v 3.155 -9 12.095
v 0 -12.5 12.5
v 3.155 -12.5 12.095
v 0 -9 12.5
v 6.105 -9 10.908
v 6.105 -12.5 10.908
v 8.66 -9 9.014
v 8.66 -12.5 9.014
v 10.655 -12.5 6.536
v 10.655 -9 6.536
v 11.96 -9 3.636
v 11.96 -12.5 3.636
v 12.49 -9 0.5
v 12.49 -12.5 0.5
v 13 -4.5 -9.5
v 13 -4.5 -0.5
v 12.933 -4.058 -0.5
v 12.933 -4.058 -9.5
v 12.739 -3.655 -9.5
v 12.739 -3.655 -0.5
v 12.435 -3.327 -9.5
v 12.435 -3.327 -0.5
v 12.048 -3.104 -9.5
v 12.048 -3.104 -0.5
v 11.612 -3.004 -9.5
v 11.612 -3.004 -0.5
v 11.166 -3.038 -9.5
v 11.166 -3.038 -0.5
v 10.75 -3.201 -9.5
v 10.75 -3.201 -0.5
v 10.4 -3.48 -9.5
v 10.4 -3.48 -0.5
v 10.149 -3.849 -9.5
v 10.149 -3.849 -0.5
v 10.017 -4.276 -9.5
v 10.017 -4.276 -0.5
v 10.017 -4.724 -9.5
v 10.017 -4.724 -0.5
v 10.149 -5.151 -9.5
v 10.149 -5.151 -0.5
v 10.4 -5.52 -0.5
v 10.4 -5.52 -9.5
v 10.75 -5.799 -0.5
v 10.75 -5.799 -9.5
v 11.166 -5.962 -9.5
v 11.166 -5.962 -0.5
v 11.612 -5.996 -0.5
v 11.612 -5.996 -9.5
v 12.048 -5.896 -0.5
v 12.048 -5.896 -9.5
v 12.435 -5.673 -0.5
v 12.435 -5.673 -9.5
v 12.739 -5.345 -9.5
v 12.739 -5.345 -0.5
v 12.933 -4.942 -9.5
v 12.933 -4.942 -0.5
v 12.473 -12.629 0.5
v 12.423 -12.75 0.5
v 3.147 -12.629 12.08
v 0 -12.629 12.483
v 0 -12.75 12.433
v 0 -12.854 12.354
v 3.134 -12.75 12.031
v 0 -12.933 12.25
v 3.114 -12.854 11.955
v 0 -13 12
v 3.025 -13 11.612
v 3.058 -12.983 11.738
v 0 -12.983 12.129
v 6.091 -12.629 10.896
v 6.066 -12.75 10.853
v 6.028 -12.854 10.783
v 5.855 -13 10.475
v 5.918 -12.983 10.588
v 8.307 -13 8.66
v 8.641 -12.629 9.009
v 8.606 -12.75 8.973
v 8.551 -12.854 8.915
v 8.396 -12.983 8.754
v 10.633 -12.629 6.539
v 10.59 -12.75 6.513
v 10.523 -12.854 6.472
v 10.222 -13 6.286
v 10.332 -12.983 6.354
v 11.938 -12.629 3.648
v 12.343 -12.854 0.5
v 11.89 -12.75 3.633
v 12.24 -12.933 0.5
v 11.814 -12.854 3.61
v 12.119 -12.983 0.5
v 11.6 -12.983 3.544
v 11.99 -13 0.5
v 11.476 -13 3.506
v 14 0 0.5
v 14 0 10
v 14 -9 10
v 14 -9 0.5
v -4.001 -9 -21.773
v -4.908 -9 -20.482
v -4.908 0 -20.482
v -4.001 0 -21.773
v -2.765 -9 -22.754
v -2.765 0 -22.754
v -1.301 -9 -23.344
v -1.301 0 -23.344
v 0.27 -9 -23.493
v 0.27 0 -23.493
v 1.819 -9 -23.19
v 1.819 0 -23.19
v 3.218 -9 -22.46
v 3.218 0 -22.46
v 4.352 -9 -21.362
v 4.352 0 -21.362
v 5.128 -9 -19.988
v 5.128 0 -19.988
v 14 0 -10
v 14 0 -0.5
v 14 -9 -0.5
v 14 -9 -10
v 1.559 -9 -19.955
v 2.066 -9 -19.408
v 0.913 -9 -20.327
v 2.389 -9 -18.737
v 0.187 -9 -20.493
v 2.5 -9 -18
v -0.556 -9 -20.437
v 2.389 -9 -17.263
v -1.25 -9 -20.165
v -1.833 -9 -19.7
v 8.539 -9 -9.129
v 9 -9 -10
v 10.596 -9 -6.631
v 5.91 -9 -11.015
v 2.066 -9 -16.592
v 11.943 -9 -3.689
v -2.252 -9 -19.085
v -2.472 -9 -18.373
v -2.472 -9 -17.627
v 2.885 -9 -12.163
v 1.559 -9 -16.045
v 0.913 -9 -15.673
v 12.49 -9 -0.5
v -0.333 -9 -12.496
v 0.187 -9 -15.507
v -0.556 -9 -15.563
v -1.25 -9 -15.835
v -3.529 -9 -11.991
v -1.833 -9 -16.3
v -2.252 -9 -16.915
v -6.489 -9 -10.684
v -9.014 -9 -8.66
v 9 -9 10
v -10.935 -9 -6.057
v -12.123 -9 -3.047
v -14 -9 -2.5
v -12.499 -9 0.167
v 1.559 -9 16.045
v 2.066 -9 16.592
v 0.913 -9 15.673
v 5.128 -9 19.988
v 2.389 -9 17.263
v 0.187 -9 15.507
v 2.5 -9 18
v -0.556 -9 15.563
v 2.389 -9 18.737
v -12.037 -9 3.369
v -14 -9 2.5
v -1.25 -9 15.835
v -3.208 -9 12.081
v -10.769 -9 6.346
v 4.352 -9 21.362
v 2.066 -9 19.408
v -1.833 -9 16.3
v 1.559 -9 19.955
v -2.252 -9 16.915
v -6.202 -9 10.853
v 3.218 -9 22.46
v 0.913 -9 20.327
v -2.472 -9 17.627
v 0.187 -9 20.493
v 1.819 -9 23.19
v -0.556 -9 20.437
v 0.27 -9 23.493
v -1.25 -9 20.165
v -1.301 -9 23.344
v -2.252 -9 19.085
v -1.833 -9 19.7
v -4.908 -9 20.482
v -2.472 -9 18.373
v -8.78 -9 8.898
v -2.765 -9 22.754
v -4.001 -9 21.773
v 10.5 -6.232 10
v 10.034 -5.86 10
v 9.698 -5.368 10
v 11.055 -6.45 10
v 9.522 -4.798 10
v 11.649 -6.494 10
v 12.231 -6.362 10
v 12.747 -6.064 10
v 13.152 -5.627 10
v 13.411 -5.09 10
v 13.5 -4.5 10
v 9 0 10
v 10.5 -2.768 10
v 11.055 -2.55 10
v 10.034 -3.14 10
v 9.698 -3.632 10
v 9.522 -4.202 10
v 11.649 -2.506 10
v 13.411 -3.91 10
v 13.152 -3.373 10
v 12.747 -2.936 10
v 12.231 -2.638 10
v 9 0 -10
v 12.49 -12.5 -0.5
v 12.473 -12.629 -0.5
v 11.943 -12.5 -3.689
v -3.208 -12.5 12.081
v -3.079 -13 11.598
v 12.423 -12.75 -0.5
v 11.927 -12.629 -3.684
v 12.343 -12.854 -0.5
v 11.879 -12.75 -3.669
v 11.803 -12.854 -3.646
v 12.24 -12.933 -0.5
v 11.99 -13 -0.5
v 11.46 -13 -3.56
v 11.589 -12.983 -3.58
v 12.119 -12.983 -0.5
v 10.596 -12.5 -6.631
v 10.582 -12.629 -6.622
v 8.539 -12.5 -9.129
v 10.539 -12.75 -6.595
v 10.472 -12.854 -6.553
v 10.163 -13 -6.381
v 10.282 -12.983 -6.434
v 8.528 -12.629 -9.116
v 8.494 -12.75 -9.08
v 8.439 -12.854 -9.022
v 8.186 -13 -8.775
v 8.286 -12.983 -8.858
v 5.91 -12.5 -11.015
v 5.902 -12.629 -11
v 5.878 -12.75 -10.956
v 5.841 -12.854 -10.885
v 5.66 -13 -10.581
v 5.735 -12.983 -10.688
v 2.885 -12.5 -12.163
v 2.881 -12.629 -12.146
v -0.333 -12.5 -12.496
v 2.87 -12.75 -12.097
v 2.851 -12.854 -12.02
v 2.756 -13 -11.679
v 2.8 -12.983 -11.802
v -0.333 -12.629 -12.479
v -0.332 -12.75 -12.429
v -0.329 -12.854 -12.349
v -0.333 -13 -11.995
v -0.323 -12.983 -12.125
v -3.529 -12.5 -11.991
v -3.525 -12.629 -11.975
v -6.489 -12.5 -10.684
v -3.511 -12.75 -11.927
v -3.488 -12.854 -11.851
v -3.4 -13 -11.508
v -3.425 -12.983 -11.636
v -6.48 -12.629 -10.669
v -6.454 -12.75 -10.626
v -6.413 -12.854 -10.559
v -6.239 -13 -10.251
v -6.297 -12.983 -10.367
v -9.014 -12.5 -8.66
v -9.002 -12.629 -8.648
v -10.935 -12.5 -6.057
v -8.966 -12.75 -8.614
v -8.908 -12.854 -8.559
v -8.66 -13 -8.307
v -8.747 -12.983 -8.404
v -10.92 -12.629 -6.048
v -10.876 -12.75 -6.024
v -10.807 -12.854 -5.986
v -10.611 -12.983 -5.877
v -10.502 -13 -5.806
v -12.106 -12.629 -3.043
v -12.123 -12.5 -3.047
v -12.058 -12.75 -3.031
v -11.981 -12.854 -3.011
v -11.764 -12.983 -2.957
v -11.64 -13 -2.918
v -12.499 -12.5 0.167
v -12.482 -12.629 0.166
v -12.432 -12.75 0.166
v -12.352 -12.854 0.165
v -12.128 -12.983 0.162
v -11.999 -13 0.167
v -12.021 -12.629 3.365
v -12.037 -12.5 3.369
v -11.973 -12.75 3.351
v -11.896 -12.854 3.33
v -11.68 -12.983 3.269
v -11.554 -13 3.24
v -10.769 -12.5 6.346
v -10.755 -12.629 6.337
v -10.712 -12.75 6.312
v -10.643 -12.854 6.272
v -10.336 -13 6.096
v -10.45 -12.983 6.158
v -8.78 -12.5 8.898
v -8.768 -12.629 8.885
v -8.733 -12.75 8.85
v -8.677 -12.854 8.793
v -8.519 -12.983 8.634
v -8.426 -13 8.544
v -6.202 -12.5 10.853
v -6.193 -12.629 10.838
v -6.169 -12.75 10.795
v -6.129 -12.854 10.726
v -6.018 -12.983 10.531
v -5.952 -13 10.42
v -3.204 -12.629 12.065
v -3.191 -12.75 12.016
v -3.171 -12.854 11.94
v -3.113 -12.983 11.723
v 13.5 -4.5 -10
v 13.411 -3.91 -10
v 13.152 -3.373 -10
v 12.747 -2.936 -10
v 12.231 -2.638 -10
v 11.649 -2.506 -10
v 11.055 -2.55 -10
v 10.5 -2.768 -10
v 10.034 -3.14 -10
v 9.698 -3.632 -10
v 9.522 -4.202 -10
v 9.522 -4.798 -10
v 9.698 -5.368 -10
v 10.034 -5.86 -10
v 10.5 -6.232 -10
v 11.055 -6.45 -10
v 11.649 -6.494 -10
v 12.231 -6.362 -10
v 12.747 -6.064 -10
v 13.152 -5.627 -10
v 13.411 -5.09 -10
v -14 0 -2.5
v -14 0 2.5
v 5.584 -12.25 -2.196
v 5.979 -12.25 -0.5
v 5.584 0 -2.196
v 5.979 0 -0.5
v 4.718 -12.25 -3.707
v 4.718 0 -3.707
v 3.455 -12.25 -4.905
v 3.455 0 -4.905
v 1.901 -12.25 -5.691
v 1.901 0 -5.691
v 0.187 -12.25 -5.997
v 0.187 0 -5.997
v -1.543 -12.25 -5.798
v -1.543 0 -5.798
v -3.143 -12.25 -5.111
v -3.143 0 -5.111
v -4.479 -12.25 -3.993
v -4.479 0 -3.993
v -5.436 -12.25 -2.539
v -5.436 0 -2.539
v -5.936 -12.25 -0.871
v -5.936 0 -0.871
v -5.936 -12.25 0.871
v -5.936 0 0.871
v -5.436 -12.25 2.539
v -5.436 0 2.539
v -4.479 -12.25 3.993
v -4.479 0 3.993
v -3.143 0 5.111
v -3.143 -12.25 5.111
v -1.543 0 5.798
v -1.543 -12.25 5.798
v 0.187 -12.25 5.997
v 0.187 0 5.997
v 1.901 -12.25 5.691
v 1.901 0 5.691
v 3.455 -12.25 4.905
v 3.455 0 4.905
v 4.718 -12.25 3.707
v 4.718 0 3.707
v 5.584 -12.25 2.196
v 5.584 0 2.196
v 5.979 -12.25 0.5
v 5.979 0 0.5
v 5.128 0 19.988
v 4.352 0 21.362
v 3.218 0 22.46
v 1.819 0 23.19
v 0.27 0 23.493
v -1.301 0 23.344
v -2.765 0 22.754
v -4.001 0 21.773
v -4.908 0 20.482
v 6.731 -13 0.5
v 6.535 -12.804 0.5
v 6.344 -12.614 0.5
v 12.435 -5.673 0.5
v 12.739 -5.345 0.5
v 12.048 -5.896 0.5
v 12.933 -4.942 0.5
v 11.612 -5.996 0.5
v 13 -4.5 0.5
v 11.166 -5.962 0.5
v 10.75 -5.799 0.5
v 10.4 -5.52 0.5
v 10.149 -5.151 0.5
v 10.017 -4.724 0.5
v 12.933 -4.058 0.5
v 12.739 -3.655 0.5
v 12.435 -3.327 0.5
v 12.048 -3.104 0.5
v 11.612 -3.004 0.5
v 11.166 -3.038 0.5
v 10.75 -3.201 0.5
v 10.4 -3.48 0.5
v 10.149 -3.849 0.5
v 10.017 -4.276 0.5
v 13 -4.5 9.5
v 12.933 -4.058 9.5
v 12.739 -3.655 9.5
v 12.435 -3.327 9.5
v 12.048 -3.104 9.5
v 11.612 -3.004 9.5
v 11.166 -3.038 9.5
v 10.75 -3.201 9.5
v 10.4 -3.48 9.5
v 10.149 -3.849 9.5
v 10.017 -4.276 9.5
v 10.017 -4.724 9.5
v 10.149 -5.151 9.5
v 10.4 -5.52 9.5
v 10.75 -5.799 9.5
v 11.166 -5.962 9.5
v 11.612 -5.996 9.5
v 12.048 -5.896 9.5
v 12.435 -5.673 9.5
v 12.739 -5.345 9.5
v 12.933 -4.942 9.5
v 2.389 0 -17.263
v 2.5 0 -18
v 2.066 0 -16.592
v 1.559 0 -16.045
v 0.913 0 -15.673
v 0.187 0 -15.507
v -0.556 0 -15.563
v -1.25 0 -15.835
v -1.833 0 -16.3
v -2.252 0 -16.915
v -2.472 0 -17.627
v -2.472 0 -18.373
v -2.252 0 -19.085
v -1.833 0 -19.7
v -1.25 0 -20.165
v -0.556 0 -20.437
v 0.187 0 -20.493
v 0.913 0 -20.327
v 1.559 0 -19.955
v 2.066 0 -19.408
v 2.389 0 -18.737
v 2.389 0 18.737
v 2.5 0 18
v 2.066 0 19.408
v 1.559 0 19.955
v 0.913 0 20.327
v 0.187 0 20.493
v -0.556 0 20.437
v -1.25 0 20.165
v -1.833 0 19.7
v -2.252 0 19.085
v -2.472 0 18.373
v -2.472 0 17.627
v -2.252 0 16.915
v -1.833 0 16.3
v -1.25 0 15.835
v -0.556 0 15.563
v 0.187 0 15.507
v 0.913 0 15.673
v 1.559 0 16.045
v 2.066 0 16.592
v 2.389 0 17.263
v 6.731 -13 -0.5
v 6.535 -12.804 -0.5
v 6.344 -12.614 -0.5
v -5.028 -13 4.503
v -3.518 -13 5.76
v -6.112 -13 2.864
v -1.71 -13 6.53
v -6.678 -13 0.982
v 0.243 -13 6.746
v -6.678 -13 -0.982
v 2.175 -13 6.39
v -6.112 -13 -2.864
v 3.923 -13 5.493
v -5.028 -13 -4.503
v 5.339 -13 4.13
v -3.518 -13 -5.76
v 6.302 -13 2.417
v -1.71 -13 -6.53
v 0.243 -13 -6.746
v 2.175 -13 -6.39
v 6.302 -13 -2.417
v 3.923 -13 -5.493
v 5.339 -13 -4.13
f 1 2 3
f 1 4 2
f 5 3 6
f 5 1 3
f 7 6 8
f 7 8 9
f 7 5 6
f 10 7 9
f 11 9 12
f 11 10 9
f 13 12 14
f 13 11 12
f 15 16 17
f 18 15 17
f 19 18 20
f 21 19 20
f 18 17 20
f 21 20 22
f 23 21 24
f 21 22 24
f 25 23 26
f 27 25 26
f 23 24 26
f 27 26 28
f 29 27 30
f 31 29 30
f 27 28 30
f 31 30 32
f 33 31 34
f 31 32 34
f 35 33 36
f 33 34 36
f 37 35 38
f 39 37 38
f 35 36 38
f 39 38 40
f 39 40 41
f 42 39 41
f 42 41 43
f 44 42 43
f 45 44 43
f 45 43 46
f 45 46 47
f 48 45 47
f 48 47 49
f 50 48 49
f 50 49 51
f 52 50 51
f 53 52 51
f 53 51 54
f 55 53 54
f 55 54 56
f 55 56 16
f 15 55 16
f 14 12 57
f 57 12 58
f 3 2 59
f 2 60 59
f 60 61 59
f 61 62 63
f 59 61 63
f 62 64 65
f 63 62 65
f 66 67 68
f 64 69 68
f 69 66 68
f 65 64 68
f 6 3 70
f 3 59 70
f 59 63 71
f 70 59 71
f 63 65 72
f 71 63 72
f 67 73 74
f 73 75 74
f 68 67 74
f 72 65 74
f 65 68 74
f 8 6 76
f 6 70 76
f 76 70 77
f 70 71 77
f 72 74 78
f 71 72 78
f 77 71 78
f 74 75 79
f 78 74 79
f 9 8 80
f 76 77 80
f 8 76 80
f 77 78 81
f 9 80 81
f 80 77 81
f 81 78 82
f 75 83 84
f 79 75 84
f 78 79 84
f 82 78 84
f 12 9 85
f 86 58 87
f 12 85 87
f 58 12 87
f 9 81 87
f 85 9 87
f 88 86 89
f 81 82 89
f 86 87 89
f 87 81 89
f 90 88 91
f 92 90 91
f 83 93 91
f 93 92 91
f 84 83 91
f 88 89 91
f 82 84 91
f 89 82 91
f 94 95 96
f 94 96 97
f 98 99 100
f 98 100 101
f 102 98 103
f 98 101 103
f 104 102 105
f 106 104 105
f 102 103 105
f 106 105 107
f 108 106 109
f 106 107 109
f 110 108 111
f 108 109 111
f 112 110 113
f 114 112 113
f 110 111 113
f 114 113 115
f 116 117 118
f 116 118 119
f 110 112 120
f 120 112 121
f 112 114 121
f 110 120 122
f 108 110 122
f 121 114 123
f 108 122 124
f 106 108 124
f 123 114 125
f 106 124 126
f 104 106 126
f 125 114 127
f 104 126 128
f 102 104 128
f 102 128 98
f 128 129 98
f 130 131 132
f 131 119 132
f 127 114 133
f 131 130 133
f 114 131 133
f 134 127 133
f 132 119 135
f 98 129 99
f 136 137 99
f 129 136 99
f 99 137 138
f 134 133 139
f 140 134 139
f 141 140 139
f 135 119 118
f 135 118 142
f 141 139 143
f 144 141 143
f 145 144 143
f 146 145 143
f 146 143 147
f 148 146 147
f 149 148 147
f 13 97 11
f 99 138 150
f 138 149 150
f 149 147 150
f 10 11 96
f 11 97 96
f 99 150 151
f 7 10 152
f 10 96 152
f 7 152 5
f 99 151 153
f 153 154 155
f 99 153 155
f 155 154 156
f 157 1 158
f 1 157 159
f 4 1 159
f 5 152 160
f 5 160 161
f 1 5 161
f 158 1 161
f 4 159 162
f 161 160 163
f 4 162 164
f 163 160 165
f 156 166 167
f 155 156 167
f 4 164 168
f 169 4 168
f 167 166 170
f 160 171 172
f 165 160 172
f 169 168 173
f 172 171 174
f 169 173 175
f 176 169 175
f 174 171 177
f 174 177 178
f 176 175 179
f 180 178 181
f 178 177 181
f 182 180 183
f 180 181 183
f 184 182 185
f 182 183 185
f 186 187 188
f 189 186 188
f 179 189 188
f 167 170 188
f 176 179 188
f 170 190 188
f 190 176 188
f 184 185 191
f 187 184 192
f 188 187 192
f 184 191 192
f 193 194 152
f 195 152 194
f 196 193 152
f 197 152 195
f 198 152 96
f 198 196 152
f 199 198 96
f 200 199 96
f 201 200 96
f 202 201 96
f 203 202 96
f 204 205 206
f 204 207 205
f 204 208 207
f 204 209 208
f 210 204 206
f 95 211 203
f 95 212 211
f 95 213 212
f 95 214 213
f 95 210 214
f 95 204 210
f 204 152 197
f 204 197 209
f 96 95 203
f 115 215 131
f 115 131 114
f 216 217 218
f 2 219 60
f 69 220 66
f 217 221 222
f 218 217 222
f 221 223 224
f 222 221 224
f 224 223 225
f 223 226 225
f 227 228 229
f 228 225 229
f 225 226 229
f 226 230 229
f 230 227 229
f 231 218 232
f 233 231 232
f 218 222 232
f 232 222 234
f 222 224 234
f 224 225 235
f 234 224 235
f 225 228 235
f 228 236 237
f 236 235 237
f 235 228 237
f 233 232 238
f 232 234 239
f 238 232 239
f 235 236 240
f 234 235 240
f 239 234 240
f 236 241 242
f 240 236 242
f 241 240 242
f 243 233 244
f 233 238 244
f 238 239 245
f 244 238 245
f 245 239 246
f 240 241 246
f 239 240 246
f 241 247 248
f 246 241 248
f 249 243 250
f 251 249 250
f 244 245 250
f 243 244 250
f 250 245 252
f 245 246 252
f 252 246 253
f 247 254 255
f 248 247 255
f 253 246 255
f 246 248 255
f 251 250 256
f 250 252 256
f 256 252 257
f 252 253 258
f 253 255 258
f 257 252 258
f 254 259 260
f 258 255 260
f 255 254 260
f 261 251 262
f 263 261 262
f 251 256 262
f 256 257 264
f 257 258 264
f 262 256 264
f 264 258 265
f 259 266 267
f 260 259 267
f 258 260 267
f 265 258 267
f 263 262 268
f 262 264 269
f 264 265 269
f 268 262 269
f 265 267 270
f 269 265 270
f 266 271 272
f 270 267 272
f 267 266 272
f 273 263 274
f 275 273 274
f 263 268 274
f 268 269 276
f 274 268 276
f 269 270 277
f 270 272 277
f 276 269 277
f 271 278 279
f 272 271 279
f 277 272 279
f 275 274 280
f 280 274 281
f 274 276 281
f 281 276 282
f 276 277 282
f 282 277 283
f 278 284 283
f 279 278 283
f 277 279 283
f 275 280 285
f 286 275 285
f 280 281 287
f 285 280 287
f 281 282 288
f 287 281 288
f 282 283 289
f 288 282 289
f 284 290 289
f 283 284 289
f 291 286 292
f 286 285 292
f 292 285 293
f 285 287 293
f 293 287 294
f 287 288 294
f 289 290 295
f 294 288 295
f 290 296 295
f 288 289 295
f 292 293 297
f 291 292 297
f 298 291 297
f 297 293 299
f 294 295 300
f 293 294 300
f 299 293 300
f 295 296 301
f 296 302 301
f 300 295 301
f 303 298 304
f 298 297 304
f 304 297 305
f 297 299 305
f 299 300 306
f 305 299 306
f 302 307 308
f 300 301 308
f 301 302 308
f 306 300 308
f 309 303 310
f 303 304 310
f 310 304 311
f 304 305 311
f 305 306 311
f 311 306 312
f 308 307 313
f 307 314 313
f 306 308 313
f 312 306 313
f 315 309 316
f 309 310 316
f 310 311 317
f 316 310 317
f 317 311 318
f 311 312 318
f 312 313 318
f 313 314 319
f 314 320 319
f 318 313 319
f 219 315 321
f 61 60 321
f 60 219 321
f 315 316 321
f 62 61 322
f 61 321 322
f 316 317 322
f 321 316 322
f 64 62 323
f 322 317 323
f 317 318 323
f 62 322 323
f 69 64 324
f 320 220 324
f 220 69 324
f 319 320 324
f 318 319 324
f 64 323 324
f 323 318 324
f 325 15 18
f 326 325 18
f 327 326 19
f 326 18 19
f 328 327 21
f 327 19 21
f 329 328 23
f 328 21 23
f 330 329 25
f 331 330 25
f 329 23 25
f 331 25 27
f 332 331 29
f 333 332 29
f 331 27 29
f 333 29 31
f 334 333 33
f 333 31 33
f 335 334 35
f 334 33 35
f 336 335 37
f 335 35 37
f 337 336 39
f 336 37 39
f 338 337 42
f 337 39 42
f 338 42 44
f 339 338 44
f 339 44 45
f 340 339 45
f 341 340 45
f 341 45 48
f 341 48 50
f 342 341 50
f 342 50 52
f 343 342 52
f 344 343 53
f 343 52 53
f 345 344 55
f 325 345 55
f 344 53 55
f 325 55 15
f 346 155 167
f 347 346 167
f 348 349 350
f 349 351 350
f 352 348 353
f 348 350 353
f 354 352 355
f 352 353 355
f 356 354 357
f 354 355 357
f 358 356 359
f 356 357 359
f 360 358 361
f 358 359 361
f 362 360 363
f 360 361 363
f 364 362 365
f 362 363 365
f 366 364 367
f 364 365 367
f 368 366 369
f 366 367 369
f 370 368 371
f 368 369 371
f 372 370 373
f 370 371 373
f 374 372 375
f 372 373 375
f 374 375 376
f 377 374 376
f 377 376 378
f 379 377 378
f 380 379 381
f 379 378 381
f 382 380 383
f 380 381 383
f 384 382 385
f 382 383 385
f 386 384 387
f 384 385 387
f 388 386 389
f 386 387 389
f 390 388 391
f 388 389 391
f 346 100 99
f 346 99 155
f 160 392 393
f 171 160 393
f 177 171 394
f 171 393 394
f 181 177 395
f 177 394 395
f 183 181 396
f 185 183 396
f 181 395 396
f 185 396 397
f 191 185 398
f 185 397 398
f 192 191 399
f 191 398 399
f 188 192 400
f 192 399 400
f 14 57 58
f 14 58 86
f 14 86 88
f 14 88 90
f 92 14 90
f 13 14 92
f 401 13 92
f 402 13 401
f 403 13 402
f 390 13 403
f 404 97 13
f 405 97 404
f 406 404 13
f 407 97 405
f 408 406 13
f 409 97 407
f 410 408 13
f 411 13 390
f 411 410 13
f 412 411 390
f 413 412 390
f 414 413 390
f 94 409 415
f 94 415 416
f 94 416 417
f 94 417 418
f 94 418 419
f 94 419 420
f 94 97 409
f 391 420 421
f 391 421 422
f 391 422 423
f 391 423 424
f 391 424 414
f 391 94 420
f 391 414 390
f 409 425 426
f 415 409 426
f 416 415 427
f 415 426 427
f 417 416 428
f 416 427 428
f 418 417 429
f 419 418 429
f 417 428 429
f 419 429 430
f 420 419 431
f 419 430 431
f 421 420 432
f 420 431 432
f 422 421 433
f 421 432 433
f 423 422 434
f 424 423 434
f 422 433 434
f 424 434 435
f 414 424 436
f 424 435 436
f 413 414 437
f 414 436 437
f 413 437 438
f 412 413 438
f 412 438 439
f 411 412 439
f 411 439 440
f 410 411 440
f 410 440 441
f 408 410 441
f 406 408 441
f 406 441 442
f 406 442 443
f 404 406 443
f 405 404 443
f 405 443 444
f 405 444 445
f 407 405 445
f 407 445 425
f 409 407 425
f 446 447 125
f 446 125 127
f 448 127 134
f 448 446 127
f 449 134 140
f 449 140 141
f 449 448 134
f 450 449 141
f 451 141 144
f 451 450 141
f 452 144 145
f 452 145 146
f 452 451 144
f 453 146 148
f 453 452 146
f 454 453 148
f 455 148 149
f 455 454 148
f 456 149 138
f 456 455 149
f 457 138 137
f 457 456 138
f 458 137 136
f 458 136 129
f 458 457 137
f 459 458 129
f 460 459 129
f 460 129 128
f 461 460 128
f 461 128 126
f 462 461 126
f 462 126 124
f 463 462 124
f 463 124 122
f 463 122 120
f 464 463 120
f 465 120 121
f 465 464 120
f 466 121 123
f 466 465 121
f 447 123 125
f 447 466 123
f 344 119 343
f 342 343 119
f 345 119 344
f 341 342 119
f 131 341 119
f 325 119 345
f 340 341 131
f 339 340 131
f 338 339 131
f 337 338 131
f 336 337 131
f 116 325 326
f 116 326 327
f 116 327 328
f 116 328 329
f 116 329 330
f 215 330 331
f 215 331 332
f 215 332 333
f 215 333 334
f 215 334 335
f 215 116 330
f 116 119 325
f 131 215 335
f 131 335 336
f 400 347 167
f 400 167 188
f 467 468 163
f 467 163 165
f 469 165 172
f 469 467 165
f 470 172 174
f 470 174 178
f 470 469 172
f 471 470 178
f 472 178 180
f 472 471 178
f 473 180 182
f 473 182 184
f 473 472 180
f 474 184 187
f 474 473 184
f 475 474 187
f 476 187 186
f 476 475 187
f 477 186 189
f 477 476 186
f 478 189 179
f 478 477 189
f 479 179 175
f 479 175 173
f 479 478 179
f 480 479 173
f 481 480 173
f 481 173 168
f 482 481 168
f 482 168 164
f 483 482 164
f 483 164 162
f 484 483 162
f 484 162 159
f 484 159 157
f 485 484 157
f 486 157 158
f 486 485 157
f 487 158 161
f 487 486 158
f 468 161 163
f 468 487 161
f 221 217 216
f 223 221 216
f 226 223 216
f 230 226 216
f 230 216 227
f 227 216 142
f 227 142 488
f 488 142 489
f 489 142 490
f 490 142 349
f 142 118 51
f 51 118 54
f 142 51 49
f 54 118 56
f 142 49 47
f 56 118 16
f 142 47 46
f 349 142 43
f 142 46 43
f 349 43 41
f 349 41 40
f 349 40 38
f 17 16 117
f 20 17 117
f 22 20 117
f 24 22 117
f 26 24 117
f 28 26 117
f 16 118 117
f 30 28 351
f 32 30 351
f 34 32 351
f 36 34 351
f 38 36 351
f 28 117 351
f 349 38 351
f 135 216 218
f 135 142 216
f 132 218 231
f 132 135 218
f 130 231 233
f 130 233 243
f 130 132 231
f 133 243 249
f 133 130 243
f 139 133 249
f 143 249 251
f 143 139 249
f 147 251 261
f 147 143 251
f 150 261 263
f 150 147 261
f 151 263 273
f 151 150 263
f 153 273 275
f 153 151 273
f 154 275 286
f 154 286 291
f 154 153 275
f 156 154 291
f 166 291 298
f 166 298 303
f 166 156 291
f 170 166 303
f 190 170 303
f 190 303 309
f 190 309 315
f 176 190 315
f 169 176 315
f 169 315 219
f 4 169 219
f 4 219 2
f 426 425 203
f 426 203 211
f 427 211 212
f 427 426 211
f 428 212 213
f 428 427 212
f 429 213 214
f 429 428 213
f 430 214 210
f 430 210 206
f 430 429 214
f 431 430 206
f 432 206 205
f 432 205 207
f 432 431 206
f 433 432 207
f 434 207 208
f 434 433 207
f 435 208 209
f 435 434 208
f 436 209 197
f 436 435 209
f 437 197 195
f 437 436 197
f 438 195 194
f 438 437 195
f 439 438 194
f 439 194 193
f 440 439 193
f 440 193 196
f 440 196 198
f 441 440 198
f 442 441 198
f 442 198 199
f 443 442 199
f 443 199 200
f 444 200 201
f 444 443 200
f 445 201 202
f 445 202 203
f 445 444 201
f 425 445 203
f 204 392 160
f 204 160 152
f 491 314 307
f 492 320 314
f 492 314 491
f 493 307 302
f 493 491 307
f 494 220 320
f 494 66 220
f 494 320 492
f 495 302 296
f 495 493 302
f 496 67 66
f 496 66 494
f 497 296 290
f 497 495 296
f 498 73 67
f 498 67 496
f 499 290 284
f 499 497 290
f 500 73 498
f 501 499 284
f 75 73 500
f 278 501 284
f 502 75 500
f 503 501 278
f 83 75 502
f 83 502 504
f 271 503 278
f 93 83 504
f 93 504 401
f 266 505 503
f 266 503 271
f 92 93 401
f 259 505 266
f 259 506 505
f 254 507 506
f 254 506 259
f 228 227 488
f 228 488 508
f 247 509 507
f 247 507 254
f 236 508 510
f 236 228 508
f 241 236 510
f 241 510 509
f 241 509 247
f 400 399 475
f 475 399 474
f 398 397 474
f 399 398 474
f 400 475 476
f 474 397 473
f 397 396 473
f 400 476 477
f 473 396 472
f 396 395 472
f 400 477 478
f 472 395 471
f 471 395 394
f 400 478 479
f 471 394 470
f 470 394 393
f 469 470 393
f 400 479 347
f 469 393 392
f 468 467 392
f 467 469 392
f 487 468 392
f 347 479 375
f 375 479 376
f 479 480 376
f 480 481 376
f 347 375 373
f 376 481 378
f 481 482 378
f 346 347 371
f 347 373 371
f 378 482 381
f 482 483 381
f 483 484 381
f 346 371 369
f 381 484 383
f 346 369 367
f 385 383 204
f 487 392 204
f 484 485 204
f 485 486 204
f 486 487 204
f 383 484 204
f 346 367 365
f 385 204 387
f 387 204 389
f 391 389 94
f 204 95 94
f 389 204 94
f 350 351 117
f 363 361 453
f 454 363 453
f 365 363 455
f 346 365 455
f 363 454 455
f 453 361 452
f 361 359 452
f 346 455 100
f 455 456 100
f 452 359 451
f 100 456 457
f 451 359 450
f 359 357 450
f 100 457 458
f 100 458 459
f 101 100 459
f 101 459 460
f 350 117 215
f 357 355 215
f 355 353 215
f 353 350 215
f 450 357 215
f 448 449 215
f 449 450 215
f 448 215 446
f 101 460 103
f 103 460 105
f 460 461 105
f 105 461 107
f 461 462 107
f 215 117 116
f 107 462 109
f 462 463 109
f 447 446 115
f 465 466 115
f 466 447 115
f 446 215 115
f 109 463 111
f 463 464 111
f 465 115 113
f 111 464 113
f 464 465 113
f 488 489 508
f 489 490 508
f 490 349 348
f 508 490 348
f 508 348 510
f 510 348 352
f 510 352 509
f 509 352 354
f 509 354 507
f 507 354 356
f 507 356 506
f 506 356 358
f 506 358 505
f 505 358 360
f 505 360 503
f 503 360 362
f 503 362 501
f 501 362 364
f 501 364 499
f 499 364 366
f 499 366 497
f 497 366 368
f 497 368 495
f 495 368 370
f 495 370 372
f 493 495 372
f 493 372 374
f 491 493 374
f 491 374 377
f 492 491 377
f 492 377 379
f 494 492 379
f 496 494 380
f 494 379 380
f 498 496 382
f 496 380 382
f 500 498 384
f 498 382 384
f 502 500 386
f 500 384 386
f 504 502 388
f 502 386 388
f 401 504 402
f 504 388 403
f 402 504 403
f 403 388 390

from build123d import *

# Parameters (mm, degrees)
SKETCH001_W     = 13
SKETCH001_H     = 6.5
SKETCH_R        = 2.5
SKETCH_R_2      = 10
PAD_DEPTH       = 9
SKETCH002_R     = 1.5
POCKET_DEPTH    = 33.501
CHAMFER_SIZE    = 0.75
CHAMFER001_SIZE = 0.5
FILLET_R        = 0.5
SKETCH003_W     = 16
SKETCH003_H     = 1
POCKET001_DEPTH = 13.001


with BuildPart() as shaft_support:
    # Sketch001 → Revolution (revolve)
    with BuildSketch(Plane.YZ):
        with Locations((-6.5, 9.25)):
            Rectangle(SKETCH001_W, SKETCH001_H)
    revolve(axis=Axis((0, 0, 0), (0, 1, 0)))


with BuildPart() as shf12:
    # Sketch → Pad (new body)
    with BuildSketch(Plane.XZ):
        with BuildLine():
            Line((-14, -2.5), (-14, 2.5))
            Line((-14, 2.5), (-4.908286, 20.481678))
            ThreePointArc((5.128166, 19.987941), (0.270242, 23.493357), (-4.908286, 20.481678))
            Line((5.128166, 19.987941), (9, 10))
            Line((9, 10), (14, 10))
            Line((14, 10), (14, -10))
            Line((14, -10), (9, -10))
            Line((9, -10), (5.128167, -19.987938))
            ThreePointArc((-4.908296, -20.481659), (0.270233, -23.493357), (5.128167, -19.987938))
            Line((-4.908296, -20.481659), (-14, -2.5))
        make_face()
        with Locations((0, 18)):
            Circle(SKETCH_R, mode=Mode.SUBTRACT)
        with Locations((0, -18)):
            Circle(SKETCH_R, mode=Mode.SUBTRACT)
        Circle(SKETCH_R_2, mode=Mode.SUBTRACT)
    extrude(amount=PAD_DEPTH)

    # Fusion: union shaft-support
    add(shaft_support.part)

    # Sketch002 → Pocket (cut, through all)
    with BuildSketch(Plane.XY.offset(10)):
        with Locations((11.5, -4.5)):
            Circle(SKETCH002_R)
    extrude(amount=-POCKET_DEPTH, mode=Mode.SUBTRACT)

    # Chamfer
    chamfer_edges = [shf12.edges().sort_by_distance(p)[0] for p in [
        (0, -13, -6),
    ]]
    chamfer(chamfer_edges, length=CHAMFER_SIZE)

    # Chamfer001
    chamfer001_edges = [shf12.edges().sort_by_distance(p)[0] for p in [
        (10, -4.5, 10),
        (10, -4.5, -10),
    ]]
    chamfer(chamfer001_edges, length=CHAMFER001_SIZE)

    # Fillet
    fillet_edges = [shf12.edges().sort_by_distance(p)[0] for p in [
        (0, -13, -12.5),
    ]]
    fillet(fillet_edges, radius=FILLET_R)

    # Sketch003 → Pocket001 (cut, through all)
    with BuildSketch(Plane(origin=(0, 0, 0), x_dir=(-1, 0, 0), z_dir=(0, 1, 0))):
        with Locations((-8, 0)):
            Rectangle(SKETCH003_W, SKETCH003_H)
    extrude(amount=-POCKET001_DEPTH, mode=Mode.SUBTRACT)


solid = shf12.part
